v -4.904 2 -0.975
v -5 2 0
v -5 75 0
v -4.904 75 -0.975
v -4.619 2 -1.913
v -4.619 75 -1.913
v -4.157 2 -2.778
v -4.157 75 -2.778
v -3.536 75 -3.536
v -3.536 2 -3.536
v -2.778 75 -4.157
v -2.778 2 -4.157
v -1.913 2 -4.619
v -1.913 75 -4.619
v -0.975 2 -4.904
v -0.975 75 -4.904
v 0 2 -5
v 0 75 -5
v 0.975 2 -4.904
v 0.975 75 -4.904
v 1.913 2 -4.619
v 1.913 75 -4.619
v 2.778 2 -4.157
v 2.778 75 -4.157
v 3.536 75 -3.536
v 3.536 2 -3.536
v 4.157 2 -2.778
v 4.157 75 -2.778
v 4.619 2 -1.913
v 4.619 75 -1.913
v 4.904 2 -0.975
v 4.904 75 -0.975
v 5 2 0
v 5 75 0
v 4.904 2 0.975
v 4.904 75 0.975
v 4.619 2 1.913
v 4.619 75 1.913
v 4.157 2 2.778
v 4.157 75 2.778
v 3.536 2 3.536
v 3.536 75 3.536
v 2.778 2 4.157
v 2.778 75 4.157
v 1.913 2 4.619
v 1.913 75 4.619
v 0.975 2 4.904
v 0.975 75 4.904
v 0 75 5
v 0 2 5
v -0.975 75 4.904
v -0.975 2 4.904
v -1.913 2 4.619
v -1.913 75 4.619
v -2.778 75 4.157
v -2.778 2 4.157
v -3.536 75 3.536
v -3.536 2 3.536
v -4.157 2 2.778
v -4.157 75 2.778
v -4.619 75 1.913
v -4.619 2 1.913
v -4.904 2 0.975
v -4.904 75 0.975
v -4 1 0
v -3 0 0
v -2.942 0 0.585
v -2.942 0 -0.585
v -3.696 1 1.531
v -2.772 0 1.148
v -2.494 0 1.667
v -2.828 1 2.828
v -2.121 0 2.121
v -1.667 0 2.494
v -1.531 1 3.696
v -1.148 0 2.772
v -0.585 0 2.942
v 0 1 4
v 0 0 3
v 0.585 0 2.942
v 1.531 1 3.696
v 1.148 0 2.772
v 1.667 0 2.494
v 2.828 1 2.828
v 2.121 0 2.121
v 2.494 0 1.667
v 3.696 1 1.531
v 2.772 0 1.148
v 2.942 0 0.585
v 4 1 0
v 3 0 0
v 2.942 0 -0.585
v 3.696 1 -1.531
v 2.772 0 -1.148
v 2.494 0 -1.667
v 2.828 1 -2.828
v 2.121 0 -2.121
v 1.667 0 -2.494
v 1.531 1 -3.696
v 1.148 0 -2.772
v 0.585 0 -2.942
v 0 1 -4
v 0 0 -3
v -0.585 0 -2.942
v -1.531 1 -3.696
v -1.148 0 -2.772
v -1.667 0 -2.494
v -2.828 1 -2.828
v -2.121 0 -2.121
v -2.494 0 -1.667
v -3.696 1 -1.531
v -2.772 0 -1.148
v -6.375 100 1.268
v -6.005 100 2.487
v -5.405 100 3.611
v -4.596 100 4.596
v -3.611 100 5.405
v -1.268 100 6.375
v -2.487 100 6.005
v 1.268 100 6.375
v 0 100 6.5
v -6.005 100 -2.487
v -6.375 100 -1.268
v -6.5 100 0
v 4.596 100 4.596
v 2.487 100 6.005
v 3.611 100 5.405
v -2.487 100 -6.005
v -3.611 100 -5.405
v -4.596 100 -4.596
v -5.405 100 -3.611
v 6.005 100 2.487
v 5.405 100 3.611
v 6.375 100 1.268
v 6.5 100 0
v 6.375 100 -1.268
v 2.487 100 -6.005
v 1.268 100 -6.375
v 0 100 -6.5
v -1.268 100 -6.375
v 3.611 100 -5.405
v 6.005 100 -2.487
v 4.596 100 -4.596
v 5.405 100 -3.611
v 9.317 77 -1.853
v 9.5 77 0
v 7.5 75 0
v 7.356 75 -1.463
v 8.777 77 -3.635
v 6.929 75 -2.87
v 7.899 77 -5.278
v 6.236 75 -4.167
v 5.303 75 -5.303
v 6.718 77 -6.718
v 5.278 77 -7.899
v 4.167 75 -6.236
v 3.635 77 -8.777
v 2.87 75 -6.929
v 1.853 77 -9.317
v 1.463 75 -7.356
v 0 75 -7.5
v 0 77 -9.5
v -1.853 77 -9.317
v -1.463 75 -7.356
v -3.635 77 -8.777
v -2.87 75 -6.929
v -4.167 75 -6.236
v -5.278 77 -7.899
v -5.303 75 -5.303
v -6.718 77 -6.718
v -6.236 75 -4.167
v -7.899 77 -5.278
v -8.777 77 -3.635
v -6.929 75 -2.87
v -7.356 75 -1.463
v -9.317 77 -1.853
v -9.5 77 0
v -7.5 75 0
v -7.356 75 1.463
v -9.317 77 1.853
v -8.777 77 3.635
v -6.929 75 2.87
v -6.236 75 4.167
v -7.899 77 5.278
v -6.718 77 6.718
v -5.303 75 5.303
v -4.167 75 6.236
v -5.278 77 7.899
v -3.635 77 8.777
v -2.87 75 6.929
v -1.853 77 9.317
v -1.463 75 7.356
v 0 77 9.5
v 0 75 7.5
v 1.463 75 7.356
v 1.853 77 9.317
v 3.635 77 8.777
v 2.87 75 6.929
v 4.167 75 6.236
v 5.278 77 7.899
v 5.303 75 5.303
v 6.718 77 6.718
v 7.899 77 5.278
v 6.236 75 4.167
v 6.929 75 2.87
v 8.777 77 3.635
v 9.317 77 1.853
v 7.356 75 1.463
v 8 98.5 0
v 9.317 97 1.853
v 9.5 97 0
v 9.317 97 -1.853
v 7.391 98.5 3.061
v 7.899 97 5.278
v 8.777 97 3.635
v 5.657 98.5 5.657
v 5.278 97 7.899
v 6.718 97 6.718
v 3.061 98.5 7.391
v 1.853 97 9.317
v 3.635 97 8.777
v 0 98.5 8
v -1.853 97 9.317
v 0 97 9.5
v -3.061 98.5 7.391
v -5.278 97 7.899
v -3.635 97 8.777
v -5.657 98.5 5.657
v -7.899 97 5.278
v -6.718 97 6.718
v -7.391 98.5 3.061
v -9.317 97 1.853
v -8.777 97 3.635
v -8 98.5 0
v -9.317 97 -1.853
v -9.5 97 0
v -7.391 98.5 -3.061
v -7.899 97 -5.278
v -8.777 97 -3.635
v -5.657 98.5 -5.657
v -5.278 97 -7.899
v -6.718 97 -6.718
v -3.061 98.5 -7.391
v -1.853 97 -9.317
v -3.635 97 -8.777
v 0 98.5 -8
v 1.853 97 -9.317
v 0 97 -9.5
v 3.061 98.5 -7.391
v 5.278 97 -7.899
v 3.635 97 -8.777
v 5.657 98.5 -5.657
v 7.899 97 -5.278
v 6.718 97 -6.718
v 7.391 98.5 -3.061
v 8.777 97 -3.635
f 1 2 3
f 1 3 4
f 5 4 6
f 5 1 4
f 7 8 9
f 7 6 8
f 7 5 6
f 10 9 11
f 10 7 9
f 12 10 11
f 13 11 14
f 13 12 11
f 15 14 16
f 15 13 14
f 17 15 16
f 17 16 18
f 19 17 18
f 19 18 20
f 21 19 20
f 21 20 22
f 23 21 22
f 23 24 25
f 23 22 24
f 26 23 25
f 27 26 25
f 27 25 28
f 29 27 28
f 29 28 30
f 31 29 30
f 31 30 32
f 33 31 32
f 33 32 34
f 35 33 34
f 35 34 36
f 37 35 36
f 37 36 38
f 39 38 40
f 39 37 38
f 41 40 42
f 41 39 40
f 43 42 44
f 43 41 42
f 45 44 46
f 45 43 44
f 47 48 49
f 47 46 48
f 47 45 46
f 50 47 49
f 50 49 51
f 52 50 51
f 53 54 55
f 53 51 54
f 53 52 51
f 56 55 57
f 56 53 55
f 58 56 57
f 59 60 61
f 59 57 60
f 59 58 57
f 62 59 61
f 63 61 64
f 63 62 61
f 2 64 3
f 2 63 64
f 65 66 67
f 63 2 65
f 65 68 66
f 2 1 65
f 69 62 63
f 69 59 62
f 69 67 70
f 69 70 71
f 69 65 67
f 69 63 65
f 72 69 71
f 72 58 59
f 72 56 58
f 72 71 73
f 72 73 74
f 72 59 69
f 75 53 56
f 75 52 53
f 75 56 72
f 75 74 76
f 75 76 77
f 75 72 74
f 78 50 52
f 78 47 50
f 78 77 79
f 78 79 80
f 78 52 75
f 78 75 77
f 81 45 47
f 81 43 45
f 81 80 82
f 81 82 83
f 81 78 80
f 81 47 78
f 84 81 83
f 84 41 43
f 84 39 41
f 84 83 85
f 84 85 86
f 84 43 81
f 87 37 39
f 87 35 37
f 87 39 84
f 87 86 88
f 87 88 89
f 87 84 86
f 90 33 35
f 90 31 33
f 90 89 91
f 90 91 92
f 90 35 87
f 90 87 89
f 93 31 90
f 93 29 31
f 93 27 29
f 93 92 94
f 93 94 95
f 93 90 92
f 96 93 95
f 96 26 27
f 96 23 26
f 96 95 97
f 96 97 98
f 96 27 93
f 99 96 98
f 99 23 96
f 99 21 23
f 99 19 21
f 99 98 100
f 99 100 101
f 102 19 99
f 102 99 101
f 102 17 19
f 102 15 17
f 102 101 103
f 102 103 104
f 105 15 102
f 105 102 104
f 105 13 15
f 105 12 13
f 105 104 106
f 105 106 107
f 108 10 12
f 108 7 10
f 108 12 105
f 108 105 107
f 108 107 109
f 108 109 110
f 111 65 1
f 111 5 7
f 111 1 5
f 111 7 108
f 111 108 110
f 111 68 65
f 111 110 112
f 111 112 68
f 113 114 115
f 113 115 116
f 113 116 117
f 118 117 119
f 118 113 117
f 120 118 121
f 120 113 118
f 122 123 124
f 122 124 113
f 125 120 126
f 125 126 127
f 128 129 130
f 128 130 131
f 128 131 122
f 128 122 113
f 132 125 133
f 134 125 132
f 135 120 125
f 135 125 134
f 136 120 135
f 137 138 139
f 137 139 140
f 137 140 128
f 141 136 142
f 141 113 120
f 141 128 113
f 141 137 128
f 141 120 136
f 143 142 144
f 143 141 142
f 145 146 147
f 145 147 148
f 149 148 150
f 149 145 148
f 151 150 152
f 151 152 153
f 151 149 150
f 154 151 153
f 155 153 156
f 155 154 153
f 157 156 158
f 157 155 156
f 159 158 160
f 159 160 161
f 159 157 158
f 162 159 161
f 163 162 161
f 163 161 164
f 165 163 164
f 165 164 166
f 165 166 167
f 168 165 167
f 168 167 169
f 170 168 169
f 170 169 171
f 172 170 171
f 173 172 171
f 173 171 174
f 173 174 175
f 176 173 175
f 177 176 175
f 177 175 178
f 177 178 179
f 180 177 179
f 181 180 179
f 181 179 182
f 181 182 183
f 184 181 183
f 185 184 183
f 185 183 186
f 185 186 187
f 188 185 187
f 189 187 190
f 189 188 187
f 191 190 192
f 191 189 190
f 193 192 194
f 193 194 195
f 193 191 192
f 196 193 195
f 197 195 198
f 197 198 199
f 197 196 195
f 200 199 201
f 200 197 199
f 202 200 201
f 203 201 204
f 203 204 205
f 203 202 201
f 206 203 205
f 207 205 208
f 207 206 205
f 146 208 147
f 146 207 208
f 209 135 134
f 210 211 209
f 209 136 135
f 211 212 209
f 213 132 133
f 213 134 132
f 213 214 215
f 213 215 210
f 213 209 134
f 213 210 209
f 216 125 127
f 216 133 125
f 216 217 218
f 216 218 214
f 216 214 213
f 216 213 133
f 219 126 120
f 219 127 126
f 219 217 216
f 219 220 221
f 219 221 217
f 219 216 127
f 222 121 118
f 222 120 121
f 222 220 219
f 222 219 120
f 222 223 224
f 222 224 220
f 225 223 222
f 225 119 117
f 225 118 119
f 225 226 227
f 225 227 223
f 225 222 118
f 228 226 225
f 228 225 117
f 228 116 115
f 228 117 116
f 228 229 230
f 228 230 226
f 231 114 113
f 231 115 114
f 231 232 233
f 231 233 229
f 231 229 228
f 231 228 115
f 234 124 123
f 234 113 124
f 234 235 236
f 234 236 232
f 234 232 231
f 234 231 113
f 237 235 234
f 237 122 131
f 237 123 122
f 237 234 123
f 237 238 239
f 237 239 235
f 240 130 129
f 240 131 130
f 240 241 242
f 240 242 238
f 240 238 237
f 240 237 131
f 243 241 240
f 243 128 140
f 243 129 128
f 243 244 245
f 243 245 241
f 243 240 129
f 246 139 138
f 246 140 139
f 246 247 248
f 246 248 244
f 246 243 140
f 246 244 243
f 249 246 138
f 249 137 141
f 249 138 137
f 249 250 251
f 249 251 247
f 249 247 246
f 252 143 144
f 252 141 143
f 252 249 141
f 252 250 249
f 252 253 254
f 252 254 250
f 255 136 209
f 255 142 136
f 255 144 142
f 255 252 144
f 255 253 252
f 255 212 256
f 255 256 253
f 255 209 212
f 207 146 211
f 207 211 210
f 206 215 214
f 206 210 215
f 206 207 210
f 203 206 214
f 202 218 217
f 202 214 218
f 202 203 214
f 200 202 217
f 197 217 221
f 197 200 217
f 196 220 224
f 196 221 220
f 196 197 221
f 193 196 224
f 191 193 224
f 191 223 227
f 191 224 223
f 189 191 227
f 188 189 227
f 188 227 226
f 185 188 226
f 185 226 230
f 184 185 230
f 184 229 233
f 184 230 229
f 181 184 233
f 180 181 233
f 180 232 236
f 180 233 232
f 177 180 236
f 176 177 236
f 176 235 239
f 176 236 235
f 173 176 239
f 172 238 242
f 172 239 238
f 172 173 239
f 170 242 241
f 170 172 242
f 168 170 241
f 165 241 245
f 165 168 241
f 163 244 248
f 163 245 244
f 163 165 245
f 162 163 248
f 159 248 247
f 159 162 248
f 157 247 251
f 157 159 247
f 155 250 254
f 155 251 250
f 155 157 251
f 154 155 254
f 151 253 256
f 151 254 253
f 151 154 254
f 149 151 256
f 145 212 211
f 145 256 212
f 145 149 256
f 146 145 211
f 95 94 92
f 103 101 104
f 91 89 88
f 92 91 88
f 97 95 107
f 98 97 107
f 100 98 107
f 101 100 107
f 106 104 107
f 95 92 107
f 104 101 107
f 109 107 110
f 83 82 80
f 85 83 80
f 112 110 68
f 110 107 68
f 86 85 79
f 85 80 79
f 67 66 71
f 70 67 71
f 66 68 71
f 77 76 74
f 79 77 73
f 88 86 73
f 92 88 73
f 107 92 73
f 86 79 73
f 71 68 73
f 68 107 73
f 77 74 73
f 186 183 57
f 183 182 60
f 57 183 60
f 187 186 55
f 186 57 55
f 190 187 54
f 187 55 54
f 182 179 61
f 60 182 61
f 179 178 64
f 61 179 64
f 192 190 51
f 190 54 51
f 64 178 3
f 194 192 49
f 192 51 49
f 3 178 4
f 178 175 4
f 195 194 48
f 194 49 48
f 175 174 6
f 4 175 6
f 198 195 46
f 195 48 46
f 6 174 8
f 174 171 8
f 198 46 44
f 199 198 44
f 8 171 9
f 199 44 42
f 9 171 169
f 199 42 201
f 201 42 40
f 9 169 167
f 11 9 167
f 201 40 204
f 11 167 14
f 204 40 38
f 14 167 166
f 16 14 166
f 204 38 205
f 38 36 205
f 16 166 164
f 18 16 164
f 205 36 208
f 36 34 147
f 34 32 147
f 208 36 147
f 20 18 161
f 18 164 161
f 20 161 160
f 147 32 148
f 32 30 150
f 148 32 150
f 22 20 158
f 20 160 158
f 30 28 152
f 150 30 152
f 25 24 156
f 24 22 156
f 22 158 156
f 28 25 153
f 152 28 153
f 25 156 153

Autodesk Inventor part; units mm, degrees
ref_plane "YZ Plane" through (0, 0, 0) normal (1, 0, 0) x (0, 1, 0)
ref_plane "XZ Plane" through (0, 0, 0) normal (0, 1, 0) x (-1, 0, 0)
ref_plane "XY Plane" through (0, 0, 0) normal (0, 0, 1) x (1, 0, 0)
sketch "Sketch2" plane through (0, 0, 0) normal (0, 1, 0) x (-1, 0, 0)
  circle A0 centre (0, 0) radius 5
  dimension "d7" = 10
extrude "Extrusion1" add sketch "Sketch2" along normal blind 75
sketch "Sketch3" plane through (0, 75, 0) normal (0, 1, 0) x (1, 0, 0)
  circle A0 centre (0, 0) radius 9.5
  dimension "d10" = 19
extrude "Extrusion2" add sketch "Sketch3" along normal blind 25
sketch "Sketch4" plane through (0, 0, 0) normal (1, 0, 0) x (0, 1, 0)
  point P0 (0, 0)
chamfer "Chamfer1" distance 2 angle 45 1 edges at (5, 0, 0)
chamfer "Chamfer2" distance 3 angle 45 1 edges at (-9.5, 100, 0)
chamfer "Chamfer3" distance 2 angle 45 1 edges at (-9.5, 75, 0)
equation "\"BendRadius\" = Thickness"
equation "\"BendReliefWidth\" = Thickness"
equation "\"BendReliefDepth\" = 0.5 * Thickness"
equation "\"CornerReliefSize\" = 4 * Thickness"
equation "\"MinimumRemnant\" = 2 * Thickness"
equation "\"TransitionRadius\" = BendRadius"
equation "\"JacobiRadiusSize\" = BendRadius"
equation "\"GapSize\" = Thickness"
equation "\"Thickness\" = 0.5"
properties part number "BOLT" material "Stainless Steel"
